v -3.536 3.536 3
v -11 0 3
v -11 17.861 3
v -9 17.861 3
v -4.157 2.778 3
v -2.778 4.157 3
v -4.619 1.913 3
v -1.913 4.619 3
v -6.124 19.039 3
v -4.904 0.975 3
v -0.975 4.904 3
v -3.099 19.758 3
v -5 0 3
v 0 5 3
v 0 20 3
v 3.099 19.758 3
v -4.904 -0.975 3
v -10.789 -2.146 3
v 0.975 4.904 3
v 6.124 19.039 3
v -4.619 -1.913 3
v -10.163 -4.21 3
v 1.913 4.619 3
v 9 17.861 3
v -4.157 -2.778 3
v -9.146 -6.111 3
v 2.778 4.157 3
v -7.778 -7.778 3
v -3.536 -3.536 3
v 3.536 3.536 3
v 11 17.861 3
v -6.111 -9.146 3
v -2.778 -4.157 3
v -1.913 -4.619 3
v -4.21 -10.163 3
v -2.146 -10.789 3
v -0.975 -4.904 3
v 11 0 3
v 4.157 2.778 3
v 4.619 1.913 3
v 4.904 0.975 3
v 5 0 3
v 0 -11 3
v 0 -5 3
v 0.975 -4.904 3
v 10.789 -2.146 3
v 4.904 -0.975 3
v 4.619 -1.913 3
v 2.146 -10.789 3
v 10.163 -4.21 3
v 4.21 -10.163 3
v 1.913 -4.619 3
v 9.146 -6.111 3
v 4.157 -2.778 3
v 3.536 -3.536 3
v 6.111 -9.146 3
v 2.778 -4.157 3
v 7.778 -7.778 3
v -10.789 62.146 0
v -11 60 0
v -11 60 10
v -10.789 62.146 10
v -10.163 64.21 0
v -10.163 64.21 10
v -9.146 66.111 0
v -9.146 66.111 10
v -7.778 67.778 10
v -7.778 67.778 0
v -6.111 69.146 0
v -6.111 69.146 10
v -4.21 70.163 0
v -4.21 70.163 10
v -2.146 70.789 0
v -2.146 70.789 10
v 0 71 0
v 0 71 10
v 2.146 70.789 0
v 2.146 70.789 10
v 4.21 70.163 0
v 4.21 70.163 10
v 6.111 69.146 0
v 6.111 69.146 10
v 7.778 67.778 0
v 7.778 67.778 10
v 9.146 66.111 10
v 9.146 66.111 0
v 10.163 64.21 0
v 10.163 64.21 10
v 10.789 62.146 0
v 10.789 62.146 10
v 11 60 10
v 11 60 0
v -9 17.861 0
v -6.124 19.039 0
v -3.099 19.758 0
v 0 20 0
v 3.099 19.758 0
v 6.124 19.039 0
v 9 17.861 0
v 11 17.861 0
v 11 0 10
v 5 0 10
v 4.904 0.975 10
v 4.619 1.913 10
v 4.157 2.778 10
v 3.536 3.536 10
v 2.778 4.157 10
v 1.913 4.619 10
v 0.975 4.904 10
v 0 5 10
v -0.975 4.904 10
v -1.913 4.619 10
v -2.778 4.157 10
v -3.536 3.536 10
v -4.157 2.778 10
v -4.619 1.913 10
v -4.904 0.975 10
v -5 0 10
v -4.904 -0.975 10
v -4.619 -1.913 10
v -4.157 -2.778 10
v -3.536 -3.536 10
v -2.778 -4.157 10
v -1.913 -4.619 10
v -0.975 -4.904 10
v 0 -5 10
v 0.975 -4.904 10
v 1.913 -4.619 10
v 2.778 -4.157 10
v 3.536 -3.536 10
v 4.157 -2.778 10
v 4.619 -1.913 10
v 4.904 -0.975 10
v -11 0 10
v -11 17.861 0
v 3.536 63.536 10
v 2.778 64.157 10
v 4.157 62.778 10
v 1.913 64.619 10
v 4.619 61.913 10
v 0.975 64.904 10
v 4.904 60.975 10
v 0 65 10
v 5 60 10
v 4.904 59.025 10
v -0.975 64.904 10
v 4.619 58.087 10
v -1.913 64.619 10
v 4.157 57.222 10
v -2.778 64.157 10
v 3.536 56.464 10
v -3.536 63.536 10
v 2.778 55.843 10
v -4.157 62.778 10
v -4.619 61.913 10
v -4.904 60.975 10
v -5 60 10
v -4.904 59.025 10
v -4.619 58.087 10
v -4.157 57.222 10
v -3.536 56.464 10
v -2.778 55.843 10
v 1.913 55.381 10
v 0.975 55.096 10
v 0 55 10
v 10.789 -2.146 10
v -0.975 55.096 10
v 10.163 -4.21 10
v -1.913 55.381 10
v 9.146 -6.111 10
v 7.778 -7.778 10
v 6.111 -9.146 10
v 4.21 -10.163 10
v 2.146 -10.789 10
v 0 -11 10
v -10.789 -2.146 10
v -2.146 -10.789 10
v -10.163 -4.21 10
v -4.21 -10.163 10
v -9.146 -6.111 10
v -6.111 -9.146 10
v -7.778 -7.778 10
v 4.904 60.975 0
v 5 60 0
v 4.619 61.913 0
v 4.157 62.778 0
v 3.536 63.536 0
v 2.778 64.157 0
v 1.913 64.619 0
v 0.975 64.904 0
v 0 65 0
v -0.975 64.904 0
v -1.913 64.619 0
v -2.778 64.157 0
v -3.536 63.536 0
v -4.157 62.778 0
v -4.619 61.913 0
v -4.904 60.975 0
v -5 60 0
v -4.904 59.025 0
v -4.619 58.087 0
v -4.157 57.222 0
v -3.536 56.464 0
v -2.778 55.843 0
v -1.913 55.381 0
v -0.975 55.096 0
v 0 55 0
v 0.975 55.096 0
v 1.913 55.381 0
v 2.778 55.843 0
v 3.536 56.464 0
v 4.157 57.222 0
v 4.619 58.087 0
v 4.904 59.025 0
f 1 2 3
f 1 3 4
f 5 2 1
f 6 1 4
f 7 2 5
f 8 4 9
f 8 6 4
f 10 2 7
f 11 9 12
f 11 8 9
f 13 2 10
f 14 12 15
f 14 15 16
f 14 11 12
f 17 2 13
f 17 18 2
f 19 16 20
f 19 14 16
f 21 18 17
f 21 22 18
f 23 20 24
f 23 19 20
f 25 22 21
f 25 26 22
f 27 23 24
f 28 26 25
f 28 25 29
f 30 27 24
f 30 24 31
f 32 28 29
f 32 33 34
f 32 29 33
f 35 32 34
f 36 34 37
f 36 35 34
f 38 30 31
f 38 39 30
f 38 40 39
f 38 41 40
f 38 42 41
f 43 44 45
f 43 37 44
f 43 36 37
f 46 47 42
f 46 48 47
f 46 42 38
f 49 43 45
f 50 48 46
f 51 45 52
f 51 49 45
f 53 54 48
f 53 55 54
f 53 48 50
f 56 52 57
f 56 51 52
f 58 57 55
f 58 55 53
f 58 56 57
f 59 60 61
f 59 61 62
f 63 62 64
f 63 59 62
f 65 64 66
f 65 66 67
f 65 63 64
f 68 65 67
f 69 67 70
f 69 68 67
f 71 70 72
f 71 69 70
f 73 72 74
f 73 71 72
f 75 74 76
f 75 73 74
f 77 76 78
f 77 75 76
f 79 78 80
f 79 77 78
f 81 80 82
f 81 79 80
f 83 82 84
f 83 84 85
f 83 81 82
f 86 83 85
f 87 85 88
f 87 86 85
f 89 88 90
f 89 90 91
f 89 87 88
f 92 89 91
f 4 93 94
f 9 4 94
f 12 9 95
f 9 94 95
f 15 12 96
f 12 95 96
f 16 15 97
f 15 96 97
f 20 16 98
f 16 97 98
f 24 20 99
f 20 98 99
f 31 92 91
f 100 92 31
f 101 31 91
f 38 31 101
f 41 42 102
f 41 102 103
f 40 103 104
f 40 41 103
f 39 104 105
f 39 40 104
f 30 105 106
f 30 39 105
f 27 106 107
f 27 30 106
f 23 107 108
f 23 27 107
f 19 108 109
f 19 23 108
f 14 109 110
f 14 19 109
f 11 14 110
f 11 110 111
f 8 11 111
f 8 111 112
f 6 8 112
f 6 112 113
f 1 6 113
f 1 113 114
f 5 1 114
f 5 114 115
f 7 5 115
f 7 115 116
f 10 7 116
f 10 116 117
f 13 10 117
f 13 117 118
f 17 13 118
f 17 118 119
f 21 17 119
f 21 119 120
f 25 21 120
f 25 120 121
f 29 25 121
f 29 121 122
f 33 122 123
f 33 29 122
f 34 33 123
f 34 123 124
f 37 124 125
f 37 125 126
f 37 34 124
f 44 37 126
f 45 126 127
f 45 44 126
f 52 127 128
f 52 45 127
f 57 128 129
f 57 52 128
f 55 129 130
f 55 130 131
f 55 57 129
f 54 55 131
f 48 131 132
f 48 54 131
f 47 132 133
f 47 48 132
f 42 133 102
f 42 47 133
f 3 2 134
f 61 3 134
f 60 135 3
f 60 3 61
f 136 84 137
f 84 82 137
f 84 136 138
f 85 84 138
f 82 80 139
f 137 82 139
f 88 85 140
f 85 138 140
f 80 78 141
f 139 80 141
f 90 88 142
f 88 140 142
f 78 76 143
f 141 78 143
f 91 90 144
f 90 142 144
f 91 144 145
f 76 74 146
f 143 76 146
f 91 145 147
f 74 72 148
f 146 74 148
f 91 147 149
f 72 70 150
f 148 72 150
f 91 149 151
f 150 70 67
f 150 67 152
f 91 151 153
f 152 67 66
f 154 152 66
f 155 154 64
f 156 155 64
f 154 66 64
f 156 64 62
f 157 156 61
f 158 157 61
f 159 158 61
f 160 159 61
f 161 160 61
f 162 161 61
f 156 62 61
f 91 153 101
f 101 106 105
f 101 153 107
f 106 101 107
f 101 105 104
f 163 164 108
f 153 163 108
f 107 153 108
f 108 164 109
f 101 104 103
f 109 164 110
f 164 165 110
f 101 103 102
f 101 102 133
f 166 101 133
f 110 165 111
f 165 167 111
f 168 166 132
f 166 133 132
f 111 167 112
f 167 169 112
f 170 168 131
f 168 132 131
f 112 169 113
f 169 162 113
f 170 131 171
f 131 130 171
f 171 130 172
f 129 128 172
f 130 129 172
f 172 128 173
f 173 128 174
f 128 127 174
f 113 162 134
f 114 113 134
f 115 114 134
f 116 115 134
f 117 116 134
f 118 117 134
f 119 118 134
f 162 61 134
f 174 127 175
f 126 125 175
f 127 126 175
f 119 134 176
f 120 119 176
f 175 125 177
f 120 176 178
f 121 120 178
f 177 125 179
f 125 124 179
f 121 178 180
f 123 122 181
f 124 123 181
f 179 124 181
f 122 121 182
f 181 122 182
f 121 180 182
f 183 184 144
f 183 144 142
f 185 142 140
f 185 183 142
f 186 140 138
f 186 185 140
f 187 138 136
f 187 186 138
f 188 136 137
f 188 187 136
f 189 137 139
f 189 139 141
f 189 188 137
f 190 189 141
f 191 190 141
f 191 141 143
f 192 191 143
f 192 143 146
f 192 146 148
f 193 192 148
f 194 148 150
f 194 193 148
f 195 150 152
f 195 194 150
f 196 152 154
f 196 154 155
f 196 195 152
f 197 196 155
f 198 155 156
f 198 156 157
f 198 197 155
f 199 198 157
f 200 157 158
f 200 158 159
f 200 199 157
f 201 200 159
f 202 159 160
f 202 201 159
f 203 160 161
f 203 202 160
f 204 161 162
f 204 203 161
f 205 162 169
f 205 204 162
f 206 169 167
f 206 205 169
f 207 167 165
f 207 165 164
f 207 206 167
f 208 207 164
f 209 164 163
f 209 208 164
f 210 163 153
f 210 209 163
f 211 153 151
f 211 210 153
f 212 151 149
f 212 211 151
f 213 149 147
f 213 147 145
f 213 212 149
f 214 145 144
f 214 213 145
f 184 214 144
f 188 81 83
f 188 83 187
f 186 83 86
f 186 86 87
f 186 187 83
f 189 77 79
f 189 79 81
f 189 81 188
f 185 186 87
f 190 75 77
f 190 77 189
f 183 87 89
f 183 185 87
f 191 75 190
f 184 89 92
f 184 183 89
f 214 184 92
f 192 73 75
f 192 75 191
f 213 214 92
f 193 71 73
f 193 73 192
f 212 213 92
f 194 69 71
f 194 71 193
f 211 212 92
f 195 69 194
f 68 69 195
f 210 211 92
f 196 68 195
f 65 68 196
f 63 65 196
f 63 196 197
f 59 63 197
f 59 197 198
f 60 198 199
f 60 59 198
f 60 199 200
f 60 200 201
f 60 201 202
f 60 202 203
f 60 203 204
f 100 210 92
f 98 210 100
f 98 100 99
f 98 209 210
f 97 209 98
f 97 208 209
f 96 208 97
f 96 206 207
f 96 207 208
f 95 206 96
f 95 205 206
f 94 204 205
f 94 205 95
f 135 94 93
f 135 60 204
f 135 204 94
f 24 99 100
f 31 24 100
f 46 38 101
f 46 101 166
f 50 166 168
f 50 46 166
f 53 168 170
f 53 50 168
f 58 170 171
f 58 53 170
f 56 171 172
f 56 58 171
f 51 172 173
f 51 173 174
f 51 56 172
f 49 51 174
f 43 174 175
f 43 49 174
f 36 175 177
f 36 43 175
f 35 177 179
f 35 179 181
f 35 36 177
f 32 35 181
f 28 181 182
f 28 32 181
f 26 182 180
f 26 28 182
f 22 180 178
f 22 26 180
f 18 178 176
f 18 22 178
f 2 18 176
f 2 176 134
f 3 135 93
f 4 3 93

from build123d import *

# Parameters (mm, degrees)
SKETCH1_R           = 5
BOSS_EXTRUDE1_DEPTH = 10
CUT_EXTRUDE1_DEPTH  = 3


with BuildPart() as part:
    # Sketch1 → Boss-Extrude1 (new body)
    with BuildSketch(Plane(origin=(0, 0, 0), x_dir=(0, 1, 0), z_dir=(0, 0, 1))):
        with BuildLine():
            Line((0, 11), (60, 11))
            ThreePointArc((60, 11), (71, 0), (60, -11))
            Line((60, -11), (0, -11))
            ThreePointArc((0, -11), (-11, 0), (0, 11))
        make_face()
        with Locations(Location((0, 0, 0), (0, 0, 270))):
            Circle(SKETCH1_R, mode=Mode.SUBTRACT)
        with Locations(Location((60, 0, 0), (0, 0, 270))):
            Circle(SKETCH1_R, mode=Mode.SUBTRACT)
    extrude(amount=BOSS_EXTRUDE1_DEPTH)

    # Sketch2 → Cut-Extrude1 (cut)
    with BuildSketch(Plane(origin=(0, 0, 0), x_dir=(1, 0, 0), z_dir=(0, 0, -1))):
        with BuildLine():
            Line((9, -17.860571099), (11, -17.860571099))
            Line((11, -17.860571099), (11, 0))
            ThreePointArc((11, 0), (0, 11), (-11, 0))
            Line((-11, 0), (-11, -17.860571099))
            Line((-11, -17.860571099), (-9, -17.860571099))
            ThreePointArc((-9, -17.860571099), (0, -20), (9, -17.860571099))
        make_face()
    extrude(amount=-CUT_EXTRUDE1_DEPTH, mode=Mode.SUBTRACT)


solid = part.part
